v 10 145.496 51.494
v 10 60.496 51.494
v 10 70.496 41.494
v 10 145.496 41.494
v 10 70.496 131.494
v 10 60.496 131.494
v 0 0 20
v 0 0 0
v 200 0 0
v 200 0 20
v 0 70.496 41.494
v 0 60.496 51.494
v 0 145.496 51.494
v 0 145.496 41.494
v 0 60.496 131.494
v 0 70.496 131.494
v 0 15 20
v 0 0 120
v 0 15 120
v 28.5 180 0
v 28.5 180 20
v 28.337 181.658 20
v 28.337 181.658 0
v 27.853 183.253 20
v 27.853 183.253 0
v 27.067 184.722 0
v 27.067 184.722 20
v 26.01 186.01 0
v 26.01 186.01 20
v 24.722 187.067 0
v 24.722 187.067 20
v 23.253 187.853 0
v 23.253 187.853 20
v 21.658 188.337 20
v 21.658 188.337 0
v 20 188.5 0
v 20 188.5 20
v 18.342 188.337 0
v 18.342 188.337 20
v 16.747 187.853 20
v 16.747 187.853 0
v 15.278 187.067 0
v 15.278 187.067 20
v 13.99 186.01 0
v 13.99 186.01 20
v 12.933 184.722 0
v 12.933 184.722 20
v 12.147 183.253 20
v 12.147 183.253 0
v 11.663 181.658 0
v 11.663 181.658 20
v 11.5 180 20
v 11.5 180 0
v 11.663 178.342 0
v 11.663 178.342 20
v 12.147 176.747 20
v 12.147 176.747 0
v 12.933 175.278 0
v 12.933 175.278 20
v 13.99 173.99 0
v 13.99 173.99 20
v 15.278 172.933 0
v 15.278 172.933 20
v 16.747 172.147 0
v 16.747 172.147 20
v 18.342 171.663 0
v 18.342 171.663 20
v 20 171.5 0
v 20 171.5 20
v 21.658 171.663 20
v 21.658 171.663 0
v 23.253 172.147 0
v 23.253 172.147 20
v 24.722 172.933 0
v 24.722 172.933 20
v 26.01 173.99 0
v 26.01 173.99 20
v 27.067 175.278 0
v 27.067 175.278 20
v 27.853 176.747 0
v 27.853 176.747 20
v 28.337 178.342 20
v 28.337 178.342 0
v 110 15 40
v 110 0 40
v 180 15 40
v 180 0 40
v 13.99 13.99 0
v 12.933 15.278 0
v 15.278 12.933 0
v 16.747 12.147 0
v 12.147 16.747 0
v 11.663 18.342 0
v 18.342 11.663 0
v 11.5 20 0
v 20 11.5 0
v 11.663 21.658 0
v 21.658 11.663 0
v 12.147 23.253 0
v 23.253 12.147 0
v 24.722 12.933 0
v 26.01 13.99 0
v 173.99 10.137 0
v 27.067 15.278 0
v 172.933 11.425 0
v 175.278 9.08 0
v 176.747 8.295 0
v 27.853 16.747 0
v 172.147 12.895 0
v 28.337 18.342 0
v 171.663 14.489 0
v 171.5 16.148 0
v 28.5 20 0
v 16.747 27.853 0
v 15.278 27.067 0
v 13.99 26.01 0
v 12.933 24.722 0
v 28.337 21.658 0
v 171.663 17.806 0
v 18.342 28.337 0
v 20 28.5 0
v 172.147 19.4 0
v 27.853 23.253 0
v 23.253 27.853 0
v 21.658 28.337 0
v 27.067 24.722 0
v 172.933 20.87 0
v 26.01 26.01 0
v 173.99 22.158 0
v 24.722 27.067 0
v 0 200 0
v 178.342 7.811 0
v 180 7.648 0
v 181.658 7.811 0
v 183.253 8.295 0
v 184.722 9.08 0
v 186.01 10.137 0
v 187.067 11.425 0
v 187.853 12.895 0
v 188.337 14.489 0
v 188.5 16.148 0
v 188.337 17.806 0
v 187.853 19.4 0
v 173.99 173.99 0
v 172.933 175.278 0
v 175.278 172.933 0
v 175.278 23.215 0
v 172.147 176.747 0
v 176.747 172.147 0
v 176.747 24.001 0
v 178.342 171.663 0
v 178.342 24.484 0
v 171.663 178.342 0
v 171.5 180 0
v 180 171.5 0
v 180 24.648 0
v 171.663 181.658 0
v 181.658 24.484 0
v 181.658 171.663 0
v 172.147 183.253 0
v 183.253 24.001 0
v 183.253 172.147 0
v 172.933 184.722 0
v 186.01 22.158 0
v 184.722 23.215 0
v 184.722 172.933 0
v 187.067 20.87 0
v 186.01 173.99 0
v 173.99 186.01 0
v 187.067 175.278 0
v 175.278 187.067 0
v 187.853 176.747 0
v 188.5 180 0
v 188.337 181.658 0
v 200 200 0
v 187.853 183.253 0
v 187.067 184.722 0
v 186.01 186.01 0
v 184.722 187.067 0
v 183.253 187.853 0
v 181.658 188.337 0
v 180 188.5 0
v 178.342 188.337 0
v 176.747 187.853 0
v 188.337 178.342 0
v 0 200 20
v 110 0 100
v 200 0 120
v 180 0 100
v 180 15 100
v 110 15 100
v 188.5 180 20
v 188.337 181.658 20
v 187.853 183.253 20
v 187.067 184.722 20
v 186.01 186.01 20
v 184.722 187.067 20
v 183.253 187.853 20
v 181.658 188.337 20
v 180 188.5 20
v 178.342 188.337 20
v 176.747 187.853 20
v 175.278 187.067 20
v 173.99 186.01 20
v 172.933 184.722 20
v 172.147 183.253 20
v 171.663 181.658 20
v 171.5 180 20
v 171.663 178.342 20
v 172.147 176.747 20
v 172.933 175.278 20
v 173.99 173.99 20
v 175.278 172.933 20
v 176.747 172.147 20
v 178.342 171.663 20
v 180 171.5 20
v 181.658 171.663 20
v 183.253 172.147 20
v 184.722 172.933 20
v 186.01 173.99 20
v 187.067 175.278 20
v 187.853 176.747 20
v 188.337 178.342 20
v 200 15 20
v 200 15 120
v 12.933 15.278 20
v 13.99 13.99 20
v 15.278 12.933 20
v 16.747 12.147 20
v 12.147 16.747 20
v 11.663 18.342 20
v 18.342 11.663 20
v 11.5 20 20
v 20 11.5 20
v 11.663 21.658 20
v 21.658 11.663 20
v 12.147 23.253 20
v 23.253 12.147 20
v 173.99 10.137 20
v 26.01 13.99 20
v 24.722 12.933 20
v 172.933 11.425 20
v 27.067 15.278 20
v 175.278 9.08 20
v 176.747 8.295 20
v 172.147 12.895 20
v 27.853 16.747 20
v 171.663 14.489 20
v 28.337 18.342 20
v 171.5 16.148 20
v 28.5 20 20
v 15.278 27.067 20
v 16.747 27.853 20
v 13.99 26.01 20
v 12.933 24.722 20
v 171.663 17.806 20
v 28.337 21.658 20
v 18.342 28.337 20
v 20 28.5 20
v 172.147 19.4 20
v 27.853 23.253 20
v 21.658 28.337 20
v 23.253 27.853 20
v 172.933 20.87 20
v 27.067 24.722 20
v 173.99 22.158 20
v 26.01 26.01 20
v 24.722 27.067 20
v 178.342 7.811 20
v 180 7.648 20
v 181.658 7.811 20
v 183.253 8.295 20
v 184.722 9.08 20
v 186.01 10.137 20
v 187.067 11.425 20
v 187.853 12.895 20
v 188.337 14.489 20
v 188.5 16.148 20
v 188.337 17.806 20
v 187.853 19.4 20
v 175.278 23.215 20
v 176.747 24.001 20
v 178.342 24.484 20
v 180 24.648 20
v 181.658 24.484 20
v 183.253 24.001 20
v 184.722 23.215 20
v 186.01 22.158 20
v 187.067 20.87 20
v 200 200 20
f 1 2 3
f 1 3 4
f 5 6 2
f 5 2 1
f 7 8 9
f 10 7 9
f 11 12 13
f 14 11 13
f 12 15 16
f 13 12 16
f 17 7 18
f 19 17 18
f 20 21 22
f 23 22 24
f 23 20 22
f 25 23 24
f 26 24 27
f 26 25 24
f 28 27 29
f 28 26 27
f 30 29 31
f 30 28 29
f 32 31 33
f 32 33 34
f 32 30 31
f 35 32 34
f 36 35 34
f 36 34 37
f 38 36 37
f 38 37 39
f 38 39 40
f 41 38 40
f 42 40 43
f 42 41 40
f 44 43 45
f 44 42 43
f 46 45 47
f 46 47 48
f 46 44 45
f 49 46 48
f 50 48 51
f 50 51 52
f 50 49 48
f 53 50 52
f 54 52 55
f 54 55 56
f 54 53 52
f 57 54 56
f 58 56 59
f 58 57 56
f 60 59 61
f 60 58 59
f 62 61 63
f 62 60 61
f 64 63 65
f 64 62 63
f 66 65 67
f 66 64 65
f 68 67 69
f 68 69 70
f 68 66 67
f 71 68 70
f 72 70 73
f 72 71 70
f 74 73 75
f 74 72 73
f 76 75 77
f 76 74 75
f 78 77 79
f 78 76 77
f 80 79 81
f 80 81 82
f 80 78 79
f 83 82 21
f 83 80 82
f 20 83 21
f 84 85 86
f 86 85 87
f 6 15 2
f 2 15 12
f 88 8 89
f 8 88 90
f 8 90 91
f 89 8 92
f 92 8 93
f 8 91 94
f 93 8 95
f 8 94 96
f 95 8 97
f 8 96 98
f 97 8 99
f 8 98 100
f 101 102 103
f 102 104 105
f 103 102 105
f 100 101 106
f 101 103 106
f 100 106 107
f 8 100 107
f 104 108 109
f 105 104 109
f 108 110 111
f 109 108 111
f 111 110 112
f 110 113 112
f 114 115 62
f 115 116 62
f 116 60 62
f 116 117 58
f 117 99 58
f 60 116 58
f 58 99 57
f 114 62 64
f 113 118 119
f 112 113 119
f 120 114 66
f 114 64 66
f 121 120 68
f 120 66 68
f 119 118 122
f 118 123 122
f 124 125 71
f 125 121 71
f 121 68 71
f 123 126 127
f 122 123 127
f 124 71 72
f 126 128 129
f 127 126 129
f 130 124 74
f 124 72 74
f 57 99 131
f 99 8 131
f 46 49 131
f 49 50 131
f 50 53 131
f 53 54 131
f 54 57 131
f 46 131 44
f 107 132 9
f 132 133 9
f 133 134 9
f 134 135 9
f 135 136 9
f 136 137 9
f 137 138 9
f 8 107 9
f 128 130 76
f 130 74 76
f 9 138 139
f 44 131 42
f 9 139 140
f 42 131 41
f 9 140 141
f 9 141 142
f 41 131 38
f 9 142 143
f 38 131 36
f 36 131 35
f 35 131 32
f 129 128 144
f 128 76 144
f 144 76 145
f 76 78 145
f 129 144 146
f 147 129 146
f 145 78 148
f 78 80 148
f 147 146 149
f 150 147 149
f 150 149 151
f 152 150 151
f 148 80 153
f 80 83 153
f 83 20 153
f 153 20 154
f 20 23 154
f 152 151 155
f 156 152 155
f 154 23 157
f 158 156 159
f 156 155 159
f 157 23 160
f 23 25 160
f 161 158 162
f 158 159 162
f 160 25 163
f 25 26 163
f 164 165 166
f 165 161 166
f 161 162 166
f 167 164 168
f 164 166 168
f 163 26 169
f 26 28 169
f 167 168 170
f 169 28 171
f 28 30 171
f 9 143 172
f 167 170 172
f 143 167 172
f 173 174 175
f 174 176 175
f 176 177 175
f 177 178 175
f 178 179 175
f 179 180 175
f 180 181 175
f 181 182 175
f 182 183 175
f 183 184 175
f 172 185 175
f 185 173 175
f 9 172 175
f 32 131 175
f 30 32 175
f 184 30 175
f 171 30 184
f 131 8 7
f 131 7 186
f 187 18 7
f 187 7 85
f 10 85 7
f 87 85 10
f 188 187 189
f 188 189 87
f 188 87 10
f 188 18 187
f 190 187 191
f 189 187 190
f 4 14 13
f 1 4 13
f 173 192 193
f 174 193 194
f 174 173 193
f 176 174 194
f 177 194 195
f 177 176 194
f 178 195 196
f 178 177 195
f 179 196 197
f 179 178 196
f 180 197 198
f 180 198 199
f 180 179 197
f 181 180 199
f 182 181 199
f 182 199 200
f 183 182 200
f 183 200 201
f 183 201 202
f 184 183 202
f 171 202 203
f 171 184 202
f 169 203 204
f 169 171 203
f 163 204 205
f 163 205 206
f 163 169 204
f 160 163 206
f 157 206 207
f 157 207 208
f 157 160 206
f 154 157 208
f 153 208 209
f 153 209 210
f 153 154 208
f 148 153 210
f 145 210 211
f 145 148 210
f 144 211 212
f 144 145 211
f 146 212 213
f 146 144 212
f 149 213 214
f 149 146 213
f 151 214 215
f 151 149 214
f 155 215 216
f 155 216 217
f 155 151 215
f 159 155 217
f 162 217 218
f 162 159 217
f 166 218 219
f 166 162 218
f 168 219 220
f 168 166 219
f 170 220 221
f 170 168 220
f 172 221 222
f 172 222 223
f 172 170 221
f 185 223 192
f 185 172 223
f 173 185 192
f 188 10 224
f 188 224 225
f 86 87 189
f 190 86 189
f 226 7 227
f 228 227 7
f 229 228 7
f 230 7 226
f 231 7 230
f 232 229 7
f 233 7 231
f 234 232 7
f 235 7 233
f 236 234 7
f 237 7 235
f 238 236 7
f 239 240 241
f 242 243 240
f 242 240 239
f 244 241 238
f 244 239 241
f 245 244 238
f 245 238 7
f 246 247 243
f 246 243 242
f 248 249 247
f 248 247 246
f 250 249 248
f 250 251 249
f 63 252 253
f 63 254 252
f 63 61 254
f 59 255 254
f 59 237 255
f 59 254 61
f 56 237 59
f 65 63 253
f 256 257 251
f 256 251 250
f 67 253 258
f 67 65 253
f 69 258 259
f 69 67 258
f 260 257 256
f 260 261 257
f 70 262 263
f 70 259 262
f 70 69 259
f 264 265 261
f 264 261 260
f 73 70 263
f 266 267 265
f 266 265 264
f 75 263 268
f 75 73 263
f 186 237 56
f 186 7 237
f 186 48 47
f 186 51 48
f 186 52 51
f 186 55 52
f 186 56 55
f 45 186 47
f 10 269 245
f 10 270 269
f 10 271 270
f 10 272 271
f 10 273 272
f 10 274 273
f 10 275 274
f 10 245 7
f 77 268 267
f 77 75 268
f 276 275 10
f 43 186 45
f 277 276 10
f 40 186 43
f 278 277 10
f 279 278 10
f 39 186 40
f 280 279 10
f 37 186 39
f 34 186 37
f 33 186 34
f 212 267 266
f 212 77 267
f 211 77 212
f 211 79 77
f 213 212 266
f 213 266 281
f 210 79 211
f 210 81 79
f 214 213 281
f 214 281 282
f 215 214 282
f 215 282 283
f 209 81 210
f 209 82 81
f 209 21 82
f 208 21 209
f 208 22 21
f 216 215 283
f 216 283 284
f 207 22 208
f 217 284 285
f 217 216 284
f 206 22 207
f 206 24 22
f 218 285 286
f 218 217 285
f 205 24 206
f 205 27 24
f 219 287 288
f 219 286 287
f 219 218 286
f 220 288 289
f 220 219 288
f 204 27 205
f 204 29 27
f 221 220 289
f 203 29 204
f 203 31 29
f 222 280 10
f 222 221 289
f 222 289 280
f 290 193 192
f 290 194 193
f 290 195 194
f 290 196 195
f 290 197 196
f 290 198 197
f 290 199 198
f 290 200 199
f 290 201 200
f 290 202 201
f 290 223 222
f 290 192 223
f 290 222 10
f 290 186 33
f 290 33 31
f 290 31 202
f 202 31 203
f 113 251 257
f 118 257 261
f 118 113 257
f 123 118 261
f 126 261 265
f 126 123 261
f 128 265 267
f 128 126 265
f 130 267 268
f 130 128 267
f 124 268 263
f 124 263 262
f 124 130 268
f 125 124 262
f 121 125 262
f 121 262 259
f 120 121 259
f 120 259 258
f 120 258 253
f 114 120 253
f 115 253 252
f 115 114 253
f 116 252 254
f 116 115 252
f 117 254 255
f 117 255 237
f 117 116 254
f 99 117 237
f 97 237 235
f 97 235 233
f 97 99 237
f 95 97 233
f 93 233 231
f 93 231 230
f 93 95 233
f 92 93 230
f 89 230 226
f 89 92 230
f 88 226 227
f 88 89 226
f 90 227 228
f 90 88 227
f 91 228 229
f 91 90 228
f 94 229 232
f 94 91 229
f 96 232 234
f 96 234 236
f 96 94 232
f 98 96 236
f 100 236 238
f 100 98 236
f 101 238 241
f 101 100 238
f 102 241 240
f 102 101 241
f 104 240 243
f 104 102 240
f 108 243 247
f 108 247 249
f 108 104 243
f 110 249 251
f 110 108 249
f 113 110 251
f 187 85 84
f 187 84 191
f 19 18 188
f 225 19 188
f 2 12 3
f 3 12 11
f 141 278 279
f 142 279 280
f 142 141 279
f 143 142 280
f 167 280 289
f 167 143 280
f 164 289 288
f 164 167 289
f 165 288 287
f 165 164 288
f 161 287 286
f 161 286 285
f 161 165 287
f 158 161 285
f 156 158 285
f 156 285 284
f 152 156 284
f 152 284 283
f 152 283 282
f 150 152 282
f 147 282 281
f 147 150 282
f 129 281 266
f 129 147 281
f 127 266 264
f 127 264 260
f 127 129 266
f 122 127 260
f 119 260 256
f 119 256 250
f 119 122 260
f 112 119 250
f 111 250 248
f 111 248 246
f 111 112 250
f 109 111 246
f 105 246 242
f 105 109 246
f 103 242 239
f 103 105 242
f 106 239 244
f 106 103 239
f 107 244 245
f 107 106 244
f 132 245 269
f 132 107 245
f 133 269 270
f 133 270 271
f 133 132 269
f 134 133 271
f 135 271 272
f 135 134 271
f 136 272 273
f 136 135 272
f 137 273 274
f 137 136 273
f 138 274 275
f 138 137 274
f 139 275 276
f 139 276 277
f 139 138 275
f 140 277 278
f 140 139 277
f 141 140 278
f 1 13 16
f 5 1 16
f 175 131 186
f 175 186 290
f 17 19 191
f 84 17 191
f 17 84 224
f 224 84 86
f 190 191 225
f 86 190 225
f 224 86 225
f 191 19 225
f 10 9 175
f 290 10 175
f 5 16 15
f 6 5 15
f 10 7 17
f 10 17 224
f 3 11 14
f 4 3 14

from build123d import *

# Parameters (mm, degrees)
F0_W     = 200
F0_H     = 200
F0_R     = 8.5
F1_DEPTH = 20
F2_W     = 200
F2_H     = 100
F3_DEPTH = 15
F5_DEPTH = 10
F6_W     = 70
F6_H     = 60
F7_DEPTH = 200.001


with BuildPart() as f1:
    # F0 (on Top) → F1 (new body)
    with BuildSketch(Plane.XY):
        with Locations((100, 100)):
            Rectangle(F0_W, F0_H)
        with Locations((20, 20)):
            Circle(F0_R, mode=Mode.SUBTRACT)
        with Locations((180, 16.14768)):
            Circle(F0_R, mode=Mode.SUBTRACT)
        with Locations((20, 180)):
            Circle(F0_R, mode=Mode.SUBTRACT)
        with Locations((180, 180)):
            Circle(F0_R, mode=Mode.SUBTRACT)
    extrude(amount=F1_DEPTH)


with BuildPart() as f3:
    # F2 (on Front) → F3 (new body)
    with BuildSketch(Plane.XZ):
        with Locations((100, 70)):
            Rectangle(F2_W, F2_H)
    extrude(amount=-F3_DEPTH)

    # F6 (on Front) → F7 (cut, through all)
    with BuildSketch(Plane.XZ):
        with Locations((145, 70)):
            Rectangle(F6_W, F6_H)
    extrude(amount=-F7_DEPTH, mode=Mode.SUBTRACT)


with BuildPart() as f5:
    # F4 (on Right) → F5 (new body)
    with BuildSketch(Plane.YZ):
        Polygon((70.496109, 131.493771), (60.496109, 131.493771), (60.496109, 51.493771), (70.496109, 41.493771), (145.496109, 41.493771), (145.496109, 51.493771), align=None)
    extrude(amount=F5_DEPTH)


solid = Compound([f1.part, f3.part, f5.part])
